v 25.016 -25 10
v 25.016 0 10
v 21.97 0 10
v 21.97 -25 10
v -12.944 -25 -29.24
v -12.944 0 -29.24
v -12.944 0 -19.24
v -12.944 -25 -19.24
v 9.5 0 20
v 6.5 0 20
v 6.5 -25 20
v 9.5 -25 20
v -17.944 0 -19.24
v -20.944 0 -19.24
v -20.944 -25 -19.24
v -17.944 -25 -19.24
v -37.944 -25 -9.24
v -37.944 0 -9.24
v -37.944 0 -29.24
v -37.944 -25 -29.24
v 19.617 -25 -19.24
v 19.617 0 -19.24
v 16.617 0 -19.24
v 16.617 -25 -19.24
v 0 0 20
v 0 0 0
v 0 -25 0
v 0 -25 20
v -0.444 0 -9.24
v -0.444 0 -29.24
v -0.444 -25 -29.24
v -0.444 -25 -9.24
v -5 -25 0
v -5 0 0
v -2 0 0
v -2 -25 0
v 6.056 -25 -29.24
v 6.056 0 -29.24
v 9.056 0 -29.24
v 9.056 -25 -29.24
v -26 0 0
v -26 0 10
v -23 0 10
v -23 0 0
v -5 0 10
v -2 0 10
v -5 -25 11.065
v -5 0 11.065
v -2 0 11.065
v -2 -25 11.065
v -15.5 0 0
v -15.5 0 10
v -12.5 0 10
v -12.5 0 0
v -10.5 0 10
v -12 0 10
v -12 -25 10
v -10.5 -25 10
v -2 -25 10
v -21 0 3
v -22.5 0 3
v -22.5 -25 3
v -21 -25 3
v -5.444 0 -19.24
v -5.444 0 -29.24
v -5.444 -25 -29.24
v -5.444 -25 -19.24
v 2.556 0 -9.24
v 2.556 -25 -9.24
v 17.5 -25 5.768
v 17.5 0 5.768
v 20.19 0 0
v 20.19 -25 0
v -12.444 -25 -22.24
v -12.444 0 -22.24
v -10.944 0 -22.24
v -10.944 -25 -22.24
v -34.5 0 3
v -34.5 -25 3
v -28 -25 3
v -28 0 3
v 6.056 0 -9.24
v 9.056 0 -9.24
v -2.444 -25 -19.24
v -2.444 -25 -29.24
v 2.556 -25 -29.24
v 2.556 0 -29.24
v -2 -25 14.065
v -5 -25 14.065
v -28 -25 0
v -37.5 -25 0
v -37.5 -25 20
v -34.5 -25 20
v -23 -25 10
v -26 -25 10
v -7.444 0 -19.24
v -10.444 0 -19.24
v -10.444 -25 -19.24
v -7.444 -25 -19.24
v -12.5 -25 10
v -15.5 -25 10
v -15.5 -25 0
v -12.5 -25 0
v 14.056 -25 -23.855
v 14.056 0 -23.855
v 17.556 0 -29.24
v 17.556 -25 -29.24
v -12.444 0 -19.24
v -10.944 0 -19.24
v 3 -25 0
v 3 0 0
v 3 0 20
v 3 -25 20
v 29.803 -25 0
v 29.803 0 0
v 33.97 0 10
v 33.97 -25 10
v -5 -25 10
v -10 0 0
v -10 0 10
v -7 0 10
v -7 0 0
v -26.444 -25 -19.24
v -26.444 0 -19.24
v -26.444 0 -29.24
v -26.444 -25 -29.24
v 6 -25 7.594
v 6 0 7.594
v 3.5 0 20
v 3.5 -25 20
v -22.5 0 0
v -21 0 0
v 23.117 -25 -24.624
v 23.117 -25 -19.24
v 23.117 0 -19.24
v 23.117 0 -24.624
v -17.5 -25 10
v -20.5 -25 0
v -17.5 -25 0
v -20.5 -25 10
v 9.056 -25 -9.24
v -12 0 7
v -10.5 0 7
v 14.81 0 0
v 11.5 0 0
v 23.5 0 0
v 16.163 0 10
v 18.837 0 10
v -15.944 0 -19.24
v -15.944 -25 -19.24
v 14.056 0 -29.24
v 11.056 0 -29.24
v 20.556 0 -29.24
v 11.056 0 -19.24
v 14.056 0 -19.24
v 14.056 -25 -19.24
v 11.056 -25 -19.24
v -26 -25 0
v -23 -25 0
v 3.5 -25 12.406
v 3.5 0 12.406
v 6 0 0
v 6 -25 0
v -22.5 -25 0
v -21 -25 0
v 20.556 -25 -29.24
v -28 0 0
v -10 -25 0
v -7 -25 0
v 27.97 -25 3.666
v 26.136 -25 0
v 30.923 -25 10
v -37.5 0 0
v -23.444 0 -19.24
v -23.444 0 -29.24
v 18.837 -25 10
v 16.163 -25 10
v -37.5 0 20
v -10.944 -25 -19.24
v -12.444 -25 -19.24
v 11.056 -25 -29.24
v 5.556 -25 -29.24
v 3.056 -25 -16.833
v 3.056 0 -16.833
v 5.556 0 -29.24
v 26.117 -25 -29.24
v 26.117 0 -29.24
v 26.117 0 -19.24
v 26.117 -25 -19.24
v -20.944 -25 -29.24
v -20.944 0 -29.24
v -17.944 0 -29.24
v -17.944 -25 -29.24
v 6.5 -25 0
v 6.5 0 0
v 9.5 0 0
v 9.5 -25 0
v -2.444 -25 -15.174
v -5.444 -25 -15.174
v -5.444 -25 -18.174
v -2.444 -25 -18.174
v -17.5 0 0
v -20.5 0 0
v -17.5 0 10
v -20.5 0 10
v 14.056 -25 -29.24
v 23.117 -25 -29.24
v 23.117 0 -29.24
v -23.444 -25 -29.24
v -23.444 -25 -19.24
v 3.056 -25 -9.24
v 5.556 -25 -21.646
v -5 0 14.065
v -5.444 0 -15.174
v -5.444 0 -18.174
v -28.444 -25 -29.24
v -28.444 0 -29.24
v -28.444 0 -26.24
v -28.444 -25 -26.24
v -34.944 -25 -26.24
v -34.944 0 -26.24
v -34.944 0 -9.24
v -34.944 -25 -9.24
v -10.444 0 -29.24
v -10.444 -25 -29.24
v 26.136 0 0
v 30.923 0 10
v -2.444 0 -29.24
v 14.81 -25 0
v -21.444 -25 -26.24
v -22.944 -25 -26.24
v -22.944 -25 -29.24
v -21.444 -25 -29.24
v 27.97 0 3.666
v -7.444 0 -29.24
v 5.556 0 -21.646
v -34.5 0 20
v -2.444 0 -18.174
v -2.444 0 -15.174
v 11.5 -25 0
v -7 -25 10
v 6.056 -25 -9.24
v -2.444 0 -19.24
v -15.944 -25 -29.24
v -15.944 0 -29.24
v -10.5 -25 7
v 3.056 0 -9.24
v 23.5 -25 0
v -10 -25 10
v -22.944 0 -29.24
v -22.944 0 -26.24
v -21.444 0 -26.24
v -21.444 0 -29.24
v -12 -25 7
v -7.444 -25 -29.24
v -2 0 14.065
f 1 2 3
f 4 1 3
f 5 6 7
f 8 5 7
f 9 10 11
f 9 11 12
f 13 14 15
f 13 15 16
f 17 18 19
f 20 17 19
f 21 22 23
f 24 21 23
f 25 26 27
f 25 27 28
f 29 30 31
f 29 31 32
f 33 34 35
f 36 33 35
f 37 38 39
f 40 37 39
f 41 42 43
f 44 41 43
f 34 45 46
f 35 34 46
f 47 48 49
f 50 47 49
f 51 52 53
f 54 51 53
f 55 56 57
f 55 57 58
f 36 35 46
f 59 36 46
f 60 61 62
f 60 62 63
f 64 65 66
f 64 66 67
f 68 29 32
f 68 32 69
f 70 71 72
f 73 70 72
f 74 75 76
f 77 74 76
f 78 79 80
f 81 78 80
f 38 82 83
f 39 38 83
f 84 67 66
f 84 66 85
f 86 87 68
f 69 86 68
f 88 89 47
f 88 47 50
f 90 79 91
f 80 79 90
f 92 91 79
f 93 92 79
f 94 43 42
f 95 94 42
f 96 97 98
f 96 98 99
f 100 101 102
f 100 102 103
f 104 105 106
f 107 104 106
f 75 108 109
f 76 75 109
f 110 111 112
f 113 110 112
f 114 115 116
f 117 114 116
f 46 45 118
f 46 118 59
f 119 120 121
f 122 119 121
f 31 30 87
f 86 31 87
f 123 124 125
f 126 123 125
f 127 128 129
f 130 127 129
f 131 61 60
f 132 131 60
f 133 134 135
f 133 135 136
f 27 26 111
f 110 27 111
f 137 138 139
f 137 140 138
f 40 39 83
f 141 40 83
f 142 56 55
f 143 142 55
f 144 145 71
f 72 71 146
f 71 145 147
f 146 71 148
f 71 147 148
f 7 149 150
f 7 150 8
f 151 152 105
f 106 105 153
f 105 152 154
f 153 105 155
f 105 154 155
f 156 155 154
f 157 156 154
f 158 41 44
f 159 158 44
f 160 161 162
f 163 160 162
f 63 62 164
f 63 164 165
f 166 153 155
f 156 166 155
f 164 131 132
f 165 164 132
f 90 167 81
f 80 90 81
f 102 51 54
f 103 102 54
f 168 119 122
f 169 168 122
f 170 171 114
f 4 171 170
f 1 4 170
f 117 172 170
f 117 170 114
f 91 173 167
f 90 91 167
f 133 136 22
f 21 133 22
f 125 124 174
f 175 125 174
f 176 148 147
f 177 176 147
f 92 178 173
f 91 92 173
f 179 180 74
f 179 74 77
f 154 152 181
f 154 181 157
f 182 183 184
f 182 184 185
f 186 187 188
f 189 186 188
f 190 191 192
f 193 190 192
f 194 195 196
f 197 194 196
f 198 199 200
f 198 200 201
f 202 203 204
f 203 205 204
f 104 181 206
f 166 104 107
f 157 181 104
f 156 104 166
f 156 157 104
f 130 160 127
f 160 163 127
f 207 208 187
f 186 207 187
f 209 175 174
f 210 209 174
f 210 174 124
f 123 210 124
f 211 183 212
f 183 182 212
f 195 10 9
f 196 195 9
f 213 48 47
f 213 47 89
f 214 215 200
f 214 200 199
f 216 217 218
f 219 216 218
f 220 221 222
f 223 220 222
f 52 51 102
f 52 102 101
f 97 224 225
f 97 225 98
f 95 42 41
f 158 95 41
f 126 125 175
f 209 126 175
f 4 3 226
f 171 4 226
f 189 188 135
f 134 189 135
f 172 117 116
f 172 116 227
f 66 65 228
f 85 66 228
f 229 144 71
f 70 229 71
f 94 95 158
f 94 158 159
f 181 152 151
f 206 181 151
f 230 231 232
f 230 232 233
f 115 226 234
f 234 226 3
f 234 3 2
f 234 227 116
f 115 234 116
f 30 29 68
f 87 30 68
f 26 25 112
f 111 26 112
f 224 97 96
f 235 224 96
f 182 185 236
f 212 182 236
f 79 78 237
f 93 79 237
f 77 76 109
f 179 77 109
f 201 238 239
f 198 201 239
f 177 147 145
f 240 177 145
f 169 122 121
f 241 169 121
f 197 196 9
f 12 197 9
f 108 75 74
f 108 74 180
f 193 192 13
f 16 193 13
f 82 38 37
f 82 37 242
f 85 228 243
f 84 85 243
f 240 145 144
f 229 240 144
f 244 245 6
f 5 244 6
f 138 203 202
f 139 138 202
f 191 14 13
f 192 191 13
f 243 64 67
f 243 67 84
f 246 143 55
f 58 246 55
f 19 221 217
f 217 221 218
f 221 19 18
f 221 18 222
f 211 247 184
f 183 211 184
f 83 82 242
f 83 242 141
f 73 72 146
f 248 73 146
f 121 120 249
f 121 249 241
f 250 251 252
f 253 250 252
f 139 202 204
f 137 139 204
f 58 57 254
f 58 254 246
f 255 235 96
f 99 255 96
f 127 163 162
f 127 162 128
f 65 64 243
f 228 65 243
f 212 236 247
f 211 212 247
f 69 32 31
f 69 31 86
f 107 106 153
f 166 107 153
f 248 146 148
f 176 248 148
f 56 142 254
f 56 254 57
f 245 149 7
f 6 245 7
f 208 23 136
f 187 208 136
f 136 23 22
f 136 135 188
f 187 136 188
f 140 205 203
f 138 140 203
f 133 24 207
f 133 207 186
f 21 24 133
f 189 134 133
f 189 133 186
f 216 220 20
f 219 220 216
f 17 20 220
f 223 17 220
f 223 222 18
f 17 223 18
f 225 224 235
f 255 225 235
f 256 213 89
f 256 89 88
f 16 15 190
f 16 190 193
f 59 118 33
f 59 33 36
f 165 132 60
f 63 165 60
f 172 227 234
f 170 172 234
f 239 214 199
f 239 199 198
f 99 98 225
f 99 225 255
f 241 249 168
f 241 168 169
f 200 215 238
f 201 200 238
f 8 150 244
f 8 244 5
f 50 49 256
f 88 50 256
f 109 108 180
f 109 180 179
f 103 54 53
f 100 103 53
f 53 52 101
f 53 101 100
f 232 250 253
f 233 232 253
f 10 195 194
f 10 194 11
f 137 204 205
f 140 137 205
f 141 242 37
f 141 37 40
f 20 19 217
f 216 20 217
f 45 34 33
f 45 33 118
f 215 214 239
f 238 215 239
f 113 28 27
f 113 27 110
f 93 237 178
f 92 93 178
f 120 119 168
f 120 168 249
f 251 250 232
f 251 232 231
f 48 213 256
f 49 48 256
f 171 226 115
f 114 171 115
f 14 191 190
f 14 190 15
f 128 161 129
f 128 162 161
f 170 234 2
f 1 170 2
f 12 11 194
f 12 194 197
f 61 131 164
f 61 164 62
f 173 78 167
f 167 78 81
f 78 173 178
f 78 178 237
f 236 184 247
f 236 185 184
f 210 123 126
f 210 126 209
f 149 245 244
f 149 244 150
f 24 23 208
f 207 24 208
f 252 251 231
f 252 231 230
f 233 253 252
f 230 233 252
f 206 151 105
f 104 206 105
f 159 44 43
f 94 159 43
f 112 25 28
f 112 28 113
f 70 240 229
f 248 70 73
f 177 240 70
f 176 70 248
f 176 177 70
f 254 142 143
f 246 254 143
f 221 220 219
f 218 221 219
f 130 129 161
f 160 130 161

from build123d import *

# Parameters (mm, degrees)
F0_W     = 6.5
F0_H     = 3
F0_W_2   = 1.5
F0_W_3   = 3
F0_H_2   = 10
F0_H_3   = 20
F1_DEPTH = 25
F2_W     = 6.5
F2_H     = 3
F2_W_2   = 3
F2_H_2   = 10
F2_W_3   = 1.5
F2_H_3   = 20
F2_W_4   = 2.53735
F3_DEPTH = 25


with BuildPart() as f1:
    # F0 (on Front) → F1 (new body)
    with BuildSketch(Plane.XZ):
        Polygon((-34.5, 20), (-37.5, 20), (-37.5, 0), (-34.5, 0), (-34.5, 3), align=None)
        with Locations((-31.25, 1.5)):
            Rectangle(F0_W, F0_H)
        Polygon((-20.5, 3), (-20.5, 0), (-17.5, 0), (-17.5, 10), (-20.5, 10), align=None)
        with Locations((-21.75, 1.5)):
            Rectangle(F0_W_2, F0_H)
        Polygon((-23, 10), (-26, 10), (-26, 0), (-23, 0), (-23, 3), align=None)
        with Locations((-14, 5)):
            Rectangle(F0_W_3, F0_H_2)
        with Locations((-11.25, 8.5)):
            Rectangle(F0_W_2, F0_H)
        with Locations((-8.5, 5)):
            Rectangle(F0_W_3, F0_H_2)
        with Locations((-3.5, 5)):
            Rectangle(F0_W_3, F0_H_2)
        with Locations((1.5, 10)):
            Rectangle(F0_W_3, F0_H_3)
        with Locations((8, 10)):
            Rectangle(F0_W_3, F0_H_3)
        Polygon((11.5, 0), (14.810134, 0), (17.5, 5.768437), (17.5, 10), (16.163077, 10), align=None)
        Polygon((17.5, 10), (17.5, 5.768437), (20.189866, 0), (23.5, 0), (18.836923, 10), align=None)
        Polygon((3.5, 20), (3.5, 12.406483), (6, 0), (6, 7.593517), align=None)
        Polygon((25.015931, 10), (21.969633, 10), (26.136287, 0), (27.969633, 0), (27.969633, 3.665766), align=None)
        Polygon((27.969633, 3.665766), (27.969633, 0), (29.802979, 0), (33.969633, 10), (30.923335, 10), align=None)
        with Locations((-3.5, 12.565389)):
            Rectangle(F0_W_3, F0_H)
    extrude(amount=F1_DEPTH)


with BuildPart() as f3:
    # F2 (on Front) → F3 (new body)
    with BuildSketch(Plane.XZ):
        Polygon((-34.943751, -9.239624), (-37.943751, -9.239624), (-37.943751, -29.239624), (-34.943751, -29.239624), (-34.943751, -26.239624), align=None)
        with Locations((-31.693751, -27.739624)):
            Rectangle(F2_W, F2_H)
        with Locations((-19.443751, -24.239624)):
            Rectangle(F2_W_2, F2_H_2)
        with Locations((-22.193751, -27.739624)):
            Rectangle(F2_W_3, F2_H)
        Polygon((-23.443751, -19.239624), (-26.443751, -19.239624), (-26.443751, -29.239624), (-23.443751, -29.239624), (-23.443751, -26.239624), align=None)
        with Locations((-14.443751, -24.239624)):
            Rectangle(F2_W_2, F2_H_2)
        with Locations((-11.693751, -20.739624)):
            Rectangle(F2_W_3, F2_H)
        with Locations((-8.943751, -24.239624)):
            Rectangle(F2_W_2, F2_H_2)
        with Locations((-3.943751, -24.239624)):
            Rectangle(F2_W_2, F2_H_2)
        with Locations((1.056249, -19.239624)):
            Rectangle(F2_W_2, F2_H_3)
        with Locations((7.556249, -19.239624)):
            Rectangle(F2_W_2, F2_H_3)
        with Locations((12.324924, -24.239624)):
            Rectangle(F2_W_4, F2_H_2)
        Polygon((13.593599, -19.239624), (13.593599, -29.239624), (14.056249, -29.239624), (14.056249, -23.855009), (17.556249, -29.239624), (20.556249, -29.239624), (14.056249, -19.239624), align=None)
        Polygon((3.056249, -9.239624), (3.056249, -16.833141), (5.556249, -29.239624), (5.556249, -21.646108), align=None)
        with Locations((-3.943751, -16.674235)):
            Rectangle(F2_W_2, F2_H)
        Polygon((19.61713, -19.239624), (16.61713, -19.239624), (23.11713, -29.239624), (26.11713, -29.239624), (26.11713, -19.239624), (23.11713, -19.239624), (23.11713, -24.62424), align=None)
    extrude(amount=F3_DEPTH)


solid = Compound([f1.part, f3.part])
